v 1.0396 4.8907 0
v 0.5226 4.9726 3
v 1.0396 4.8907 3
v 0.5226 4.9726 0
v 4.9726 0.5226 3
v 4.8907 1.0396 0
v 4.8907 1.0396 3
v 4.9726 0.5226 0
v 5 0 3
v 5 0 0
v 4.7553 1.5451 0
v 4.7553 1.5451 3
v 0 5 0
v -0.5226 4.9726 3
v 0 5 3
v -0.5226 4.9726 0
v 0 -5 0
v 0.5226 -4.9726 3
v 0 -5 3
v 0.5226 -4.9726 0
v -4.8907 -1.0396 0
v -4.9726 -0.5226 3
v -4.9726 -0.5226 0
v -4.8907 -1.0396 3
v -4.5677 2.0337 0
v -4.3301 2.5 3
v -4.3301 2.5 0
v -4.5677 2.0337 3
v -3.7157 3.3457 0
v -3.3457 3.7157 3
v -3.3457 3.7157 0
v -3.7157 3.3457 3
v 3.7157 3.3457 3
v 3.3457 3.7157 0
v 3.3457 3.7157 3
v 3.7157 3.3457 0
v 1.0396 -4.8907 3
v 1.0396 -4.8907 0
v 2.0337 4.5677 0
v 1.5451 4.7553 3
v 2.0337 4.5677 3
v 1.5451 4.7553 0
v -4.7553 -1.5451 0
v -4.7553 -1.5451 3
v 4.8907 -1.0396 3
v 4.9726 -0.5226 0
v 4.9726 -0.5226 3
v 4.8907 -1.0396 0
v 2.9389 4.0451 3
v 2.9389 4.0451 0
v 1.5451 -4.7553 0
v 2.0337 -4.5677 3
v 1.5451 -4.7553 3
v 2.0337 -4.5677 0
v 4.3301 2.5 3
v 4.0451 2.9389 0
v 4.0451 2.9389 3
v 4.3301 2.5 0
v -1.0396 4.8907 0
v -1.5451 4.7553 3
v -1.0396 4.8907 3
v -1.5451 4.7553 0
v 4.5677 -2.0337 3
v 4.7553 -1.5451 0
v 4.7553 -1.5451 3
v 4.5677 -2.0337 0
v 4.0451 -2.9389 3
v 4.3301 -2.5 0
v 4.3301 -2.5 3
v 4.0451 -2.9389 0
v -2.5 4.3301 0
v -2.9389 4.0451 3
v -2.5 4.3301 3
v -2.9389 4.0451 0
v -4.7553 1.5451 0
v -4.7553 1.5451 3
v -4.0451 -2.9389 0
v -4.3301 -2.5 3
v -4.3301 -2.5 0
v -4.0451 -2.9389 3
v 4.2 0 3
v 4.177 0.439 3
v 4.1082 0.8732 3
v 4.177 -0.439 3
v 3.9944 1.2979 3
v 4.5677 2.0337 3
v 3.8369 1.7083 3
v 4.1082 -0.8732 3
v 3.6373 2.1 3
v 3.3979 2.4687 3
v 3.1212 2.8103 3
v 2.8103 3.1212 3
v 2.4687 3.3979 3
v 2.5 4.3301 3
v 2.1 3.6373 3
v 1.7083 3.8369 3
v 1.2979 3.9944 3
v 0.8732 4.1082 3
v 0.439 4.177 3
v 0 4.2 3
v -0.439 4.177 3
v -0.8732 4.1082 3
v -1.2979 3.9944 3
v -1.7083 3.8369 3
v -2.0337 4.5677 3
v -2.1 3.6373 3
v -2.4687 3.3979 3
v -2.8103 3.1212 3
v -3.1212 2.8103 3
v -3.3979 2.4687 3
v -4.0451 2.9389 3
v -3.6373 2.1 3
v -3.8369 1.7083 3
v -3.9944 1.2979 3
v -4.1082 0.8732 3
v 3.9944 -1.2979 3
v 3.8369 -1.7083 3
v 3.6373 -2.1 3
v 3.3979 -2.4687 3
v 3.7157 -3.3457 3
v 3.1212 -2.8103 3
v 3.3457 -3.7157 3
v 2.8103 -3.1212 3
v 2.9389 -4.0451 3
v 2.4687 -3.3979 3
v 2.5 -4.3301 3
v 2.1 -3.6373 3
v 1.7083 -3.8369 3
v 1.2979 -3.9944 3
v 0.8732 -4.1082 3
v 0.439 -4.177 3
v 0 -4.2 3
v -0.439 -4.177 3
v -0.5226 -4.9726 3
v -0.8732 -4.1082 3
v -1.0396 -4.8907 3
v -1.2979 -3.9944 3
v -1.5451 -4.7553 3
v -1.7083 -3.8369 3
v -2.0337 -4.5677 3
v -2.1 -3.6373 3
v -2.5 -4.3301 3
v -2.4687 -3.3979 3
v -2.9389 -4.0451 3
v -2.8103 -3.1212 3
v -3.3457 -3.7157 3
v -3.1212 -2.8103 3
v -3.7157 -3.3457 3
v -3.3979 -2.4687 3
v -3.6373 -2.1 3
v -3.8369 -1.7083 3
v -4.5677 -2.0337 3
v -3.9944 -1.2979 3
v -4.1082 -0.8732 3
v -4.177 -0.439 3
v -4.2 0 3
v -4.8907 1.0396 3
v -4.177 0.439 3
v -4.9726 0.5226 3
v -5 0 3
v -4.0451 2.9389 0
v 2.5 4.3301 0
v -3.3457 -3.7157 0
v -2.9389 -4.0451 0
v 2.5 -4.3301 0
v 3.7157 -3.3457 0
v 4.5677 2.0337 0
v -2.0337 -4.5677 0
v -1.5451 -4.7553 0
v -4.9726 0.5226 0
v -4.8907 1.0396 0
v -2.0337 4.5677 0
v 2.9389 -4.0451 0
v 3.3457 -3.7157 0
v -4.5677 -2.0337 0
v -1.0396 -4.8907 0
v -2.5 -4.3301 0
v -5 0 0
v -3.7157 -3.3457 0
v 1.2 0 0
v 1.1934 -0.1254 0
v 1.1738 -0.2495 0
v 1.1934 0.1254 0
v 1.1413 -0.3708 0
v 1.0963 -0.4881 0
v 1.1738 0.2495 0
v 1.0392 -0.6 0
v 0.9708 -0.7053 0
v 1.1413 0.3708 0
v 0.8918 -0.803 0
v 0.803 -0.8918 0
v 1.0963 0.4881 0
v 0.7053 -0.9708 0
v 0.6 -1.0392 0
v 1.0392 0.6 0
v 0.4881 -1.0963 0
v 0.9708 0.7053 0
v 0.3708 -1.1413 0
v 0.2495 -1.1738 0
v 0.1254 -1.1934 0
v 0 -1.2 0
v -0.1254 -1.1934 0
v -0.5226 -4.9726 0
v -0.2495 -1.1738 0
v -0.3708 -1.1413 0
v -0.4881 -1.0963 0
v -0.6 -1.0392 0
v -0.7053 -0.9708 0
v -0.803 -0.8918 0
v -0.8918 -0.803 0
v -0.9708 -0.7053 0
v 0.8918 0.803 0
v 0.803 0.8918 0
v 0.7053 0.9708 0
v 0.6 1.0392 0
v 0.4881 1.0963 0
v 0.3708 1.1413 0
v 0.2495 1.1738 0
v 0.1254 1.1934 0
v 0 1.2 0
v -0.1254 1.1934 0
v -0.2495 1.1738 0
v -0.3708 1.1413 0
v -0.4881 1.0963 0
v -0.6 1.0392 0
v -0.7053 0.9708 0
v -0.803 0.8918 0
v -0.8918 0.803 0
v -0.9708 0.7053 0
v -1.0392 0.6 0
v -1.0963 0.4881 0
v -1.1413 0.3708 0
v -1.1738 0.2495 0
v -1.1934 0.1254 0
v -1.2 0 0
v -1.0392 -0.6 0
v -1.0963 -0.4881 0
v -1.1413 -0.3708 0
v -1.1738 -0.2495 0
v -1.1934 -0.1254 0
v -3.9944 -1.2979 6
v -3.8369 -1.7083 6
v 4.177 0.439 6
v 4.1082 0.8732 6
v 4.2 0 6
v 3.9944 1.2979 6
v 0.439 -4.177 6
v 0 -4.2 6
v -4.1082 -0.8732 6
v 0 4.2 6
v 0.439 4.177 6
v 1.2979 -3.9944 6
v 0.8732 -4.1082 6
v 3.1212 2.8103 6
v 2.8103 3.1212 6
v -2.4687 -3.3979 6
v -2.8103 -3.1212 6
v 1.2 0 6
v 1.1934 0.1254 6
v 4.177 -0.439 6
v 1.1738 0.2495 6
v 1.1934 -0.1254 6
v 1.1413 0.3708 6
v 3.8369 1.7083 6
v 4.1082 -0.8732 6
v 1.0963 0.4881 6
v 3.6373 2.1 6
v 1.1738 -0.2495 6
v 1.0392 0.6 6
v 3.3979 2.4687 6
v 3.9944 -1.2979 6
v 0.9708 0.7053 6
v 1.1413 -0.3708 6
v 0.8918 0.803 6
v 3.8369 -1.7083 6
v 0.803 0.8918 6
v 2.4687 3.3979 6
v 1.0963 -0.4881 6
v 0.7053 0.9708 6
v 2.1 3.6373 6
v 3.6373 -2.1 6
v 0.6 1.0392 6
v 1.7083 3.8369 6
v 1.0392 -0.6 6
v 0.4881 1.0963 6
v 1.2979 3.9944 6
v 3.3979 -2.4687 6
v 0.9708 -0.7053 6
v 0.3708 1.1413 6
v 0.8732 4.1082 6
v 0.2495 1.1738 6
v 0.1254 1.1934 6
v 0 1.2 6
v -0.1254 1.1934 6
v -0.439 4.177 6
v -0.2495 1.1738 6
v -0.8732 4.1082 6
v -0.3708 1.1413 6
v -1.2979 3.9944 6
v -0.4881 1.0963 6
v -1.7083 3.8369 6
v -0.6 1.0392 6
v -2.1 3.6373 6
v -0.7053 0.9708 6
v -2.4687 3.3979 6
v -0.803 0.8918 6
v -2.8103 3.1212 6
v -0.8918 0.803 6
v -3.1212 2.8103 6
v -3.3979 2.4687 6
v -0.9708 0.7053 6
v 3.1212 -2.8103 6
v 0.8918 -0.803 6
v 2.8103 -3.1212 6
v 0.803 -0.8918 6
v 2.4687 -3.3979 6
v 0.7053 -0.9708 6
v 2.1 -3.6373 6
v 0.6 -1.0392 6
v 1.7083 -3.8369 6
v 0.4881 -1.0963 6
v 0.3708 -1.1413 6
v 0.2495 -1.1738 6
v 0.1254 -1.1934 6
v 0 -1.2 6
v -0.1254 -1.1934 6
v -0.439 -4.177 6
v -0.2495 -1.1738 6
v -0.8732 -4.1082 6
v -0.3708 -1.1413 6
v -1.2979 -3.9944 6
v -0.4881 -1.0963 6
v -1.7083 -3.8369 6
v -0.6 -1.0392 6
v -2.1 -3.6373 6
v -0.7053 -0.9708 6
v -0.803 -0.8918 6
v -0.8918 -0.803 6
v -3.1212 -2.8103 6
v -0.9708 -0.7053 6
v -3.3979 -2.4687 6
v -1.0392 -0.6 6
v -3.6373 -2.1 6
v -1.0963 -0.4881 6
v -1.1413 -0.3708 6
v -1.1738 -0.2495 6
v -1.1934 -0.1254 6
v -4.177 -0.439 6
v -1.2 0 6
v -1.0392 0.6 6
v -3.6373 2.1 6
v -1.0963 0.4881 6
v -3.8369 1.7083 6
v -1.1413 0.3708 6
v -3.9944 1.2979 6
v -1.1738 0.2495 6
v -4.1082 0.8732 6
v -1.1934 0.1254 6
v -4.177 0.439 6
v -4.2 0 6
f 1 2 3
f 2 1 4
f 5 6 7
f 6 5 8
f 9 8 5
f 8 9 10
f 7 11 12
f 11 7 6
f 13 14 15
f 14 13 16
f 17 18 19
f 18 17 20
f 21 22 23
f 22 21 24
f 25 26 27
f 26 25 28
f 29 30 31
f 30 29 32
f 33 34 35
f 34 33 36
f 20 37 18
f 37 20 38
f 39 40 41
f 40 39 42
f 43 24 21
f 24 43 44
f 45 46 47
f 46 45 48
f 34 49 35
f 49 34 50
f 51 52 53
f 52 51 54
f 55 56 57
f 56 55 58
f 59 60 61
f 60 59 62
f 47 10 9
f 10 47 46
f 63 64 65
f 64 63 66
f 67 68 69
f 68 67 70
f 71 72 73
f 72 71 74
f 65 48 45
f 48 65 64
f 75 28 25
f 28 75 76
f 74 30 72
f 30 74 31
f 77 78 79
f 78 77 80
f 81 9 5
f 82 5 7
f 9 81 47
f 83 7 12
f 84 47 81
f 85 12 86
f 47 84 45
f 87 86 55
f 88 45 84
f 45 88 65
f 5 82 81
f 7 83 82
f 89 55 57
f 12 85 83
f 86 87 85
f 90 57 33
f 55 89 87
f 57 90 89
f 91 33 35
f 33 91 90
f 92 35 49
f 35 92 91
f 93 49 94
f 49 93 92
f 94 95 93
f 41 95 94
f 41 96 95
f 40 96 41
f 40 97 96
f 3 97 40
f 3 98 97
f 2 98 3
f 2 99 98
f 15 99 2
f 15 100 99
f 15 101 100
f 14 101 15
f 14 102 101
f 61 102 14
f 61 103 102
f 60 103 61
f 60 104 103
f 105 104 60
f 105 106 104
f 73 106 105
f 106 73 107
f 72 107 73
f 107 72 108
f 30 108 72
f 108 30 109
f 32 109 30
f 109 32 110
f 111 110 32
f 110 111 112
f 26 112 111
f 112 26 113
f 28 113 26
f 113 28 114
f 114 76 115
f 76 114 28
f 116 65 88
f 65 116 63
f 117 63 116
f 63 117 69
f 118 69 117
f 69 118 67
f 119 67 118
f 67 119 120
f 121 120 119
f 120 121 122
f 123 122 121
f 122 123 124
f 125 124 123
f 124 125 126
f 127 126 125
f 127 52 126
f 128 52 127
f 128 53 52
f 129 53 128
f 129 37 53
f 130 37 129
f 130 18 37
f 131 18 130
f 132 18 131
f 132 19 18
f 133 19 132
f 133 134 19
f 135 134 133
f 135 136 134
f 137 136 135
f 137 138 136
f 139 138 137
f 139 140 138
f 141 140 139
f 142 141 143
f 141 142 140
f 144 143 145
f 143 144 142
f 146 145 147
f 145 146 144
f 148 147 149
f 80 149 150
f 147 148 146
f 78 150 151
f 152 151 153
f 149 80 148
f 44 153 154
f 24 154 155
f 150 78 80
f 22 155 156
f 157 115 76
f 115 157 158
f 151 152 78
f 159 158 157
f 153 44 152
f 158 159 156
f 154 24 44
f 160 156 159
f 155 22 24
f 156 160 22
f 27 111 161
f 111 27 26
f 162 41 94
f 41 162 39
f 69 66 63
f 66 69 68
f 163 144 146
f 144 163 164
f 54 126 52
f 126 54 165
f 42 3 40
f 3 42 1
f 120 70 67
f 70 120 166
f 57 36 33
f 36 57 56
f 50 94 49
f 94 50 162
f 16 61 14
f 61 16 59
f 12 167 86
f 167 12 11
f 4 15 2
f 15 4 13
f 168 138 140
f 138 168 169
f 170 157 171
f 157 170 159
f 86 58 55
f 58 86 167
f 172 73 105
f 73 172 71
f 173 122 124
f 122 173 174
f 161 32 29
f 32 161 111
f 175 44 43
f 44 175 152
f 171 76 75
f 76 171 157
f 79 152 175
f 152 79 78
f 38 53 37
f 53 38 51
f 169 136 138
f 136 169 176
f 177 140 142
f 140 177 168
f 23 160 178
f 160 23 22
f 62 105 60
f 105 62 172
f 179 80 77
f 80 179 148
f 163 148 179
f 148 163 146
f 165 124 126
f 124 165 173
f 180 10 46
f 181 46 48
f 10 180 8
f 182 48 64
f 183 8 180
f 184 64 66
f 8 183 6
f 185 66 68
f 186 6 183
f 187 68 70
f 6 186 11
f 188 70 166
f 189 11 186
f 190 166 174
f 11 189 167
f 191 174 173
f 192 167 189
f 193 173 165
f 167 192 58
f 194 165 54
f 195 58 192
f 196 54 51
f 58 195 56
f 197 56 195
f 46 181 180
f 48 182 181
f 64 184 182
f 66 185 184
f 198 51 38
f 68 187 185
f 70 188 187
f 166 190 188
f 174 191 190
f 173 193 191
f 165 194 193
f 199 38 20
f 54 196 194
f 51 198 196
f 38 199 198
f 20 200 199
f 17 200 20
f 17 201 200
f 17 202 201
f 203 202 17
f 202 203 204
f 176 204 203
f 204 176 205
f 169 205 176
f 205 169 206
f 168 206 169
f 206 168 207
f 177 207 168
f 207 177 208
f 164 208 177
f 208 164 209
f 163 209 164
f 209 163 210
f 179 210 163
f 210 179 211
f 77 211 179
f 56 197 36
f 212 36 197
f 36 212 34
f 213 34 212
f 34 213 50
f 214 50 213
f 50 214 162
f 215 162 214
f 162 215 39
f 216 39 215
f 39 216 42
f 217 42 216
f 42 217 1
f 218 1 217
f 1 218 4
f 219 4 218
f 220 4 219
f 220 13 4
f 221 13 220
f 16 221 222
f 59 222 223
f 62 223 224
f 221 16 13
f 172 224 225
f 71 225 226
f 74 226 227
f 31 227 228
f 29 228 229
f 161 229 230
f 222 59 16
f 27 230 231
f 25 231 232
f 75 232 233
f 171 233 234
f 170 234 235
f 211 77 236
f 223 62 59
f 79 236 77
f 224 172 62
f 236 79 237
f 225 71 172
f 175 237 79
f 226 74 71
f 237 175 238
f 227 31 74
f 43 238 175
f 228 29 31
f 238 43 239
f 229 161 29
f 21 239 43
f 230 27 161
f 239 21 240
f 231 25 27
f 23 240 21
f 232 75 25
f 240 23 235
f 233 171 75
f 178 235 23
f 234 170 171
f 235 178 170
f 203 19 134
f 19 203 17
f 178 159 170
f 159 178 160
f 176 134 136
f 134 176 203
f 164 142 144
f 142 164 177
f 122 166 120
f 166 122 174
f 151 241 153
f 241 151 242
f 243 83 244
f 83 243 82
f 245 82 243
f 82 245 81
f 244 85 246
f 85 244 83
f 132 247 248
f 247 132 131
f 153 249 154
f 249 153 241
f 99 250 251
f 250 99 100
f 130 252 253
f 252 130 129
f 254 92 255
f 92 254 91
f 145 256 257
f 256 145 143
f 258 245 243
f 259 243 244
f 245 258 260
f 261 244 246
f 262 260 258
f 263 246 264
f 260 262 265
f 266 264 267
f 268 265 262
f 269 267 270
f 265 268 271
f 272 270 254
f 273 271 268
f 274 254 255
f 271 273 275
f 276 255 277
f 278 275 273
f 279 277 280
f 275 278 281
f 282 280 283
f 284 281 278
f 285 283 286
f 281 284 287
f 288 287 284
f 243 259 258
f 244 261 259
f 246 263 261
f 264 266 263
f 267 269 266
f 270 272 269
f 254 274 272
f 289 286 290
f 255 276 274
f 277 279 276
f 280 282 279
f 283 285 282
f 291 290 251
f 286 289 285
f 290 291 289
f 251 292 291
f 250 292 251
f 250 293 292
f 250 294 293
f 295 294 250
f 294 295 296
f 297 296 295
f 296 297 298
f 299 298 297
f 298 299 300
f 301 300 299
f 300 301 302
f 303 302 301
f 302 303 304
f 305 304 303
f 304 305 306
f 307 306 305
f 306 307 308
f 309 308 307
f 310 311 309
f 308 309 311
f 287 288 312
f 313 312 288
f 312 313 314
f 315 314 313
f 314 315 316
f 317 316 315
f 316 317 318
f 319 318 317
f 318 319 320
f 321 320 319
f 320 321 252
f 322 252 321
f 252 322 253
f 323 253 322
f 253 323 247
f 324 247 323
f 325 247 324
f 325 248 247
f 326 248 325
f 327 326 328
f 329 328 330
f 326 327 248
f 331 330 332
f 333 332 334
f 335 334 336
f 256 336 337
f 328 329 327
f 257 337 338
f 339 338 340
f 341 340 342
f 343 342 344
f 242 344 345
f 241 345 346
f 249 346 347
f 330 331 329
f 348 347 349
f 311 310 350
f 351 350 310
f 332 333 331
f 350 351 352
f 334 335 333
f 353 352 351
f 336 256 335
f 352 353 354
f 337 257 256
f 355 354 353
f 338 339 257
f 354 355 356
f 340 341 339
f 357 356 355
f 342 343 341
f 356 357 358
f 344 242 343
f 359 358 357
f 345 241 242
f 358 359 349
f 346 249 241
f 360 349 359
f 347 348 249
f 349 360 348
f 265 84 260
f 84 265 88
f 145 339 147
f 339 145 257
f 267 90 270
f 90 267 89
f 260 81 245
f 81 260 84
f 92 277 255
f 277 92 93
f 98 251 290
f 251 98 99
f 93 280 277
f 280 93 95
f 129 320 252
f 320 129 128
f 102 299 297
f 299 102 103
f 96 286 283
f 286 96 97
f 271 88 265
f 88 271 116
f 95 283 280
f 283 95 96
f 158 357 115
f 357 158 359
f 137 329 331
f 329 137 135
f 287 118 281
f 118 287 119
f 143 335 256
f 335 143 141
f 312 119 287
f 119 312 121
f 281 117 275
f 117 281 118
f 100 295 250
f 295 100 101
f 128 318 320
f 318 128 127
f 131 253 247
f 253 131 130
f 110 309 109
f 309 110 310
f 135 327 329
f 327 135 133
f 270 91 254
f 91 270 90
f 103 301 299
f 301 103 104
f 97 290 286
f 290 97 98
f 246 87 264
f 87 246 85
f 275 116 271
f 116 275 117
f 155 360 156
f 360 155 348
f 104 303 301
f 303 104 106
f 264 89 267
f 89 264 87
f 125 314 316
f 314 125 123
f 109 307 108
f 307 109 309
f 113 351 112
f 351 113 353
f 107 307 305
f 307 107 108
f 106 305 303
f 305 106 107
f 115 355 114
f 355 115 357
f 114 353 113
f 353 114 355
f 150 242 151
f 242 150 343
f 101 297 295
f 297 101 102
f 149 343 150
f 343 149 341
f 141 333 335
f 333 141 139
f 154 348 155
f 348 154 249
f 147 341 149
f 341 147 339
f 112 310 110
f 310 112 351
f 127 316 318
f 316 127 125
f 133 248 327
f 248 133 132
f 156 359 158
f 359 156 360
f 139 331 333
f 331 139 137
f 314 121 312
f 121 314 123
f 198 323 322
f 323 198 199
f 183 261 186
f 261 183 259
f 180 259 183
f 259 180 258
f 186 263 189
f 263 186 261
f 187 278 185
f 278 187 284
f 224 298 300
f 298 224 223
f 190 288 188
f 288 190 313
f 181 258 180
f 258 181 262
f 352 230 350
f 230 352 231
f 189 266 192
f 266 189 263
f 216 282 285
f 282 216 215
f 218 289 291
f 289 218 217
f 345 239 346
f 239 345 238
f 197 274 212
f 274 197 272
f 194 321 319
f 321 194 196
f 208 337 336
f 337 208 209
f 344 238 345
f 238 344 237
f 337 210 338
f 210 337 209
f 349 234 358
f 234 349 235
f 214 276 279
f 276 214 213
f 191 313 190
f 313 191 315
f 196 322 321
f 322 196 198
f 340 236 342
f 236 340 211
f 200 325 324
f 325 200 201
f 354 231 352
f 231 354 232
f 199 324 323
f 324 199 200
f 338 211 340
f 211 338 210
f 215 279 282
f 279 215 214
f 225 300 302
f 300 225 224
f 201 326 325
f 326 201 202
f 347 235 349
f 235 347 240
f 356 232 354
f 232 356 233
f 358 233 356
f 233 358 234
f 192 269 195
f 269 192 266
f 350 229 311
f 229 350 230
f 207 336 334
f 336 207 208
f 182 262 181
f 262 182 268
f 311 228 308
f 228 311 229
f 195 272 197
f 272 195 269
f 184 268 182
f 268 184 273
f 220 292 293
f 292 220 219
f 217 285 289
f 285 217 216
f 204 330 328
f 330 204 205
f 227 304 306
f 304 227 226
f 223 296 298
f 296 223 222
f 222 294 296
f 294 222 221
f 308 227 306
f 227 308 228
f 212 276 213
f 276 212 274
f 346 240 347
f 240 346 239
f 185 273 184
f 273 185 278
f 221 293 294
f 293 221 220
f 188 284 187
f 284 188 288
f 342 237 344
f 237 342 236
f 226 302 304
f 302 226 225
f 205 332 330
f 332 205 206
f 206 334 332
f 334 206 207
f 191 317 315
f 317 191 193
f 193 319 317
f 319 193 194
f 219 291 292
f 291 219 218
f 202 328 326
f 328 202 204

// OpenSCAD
// Threaded mounting boss.
$fn = 60;
eps = 0.02;
thread_d = 2.4;
base_d = 10;
height = 6;
difference() { union() { cylinder(d=base_d,h=3); cylinder(d=thread_d+6,h=height); } translate([0,0,-eps]) cylinder(d=thread_d,h=height+2*eps); }
